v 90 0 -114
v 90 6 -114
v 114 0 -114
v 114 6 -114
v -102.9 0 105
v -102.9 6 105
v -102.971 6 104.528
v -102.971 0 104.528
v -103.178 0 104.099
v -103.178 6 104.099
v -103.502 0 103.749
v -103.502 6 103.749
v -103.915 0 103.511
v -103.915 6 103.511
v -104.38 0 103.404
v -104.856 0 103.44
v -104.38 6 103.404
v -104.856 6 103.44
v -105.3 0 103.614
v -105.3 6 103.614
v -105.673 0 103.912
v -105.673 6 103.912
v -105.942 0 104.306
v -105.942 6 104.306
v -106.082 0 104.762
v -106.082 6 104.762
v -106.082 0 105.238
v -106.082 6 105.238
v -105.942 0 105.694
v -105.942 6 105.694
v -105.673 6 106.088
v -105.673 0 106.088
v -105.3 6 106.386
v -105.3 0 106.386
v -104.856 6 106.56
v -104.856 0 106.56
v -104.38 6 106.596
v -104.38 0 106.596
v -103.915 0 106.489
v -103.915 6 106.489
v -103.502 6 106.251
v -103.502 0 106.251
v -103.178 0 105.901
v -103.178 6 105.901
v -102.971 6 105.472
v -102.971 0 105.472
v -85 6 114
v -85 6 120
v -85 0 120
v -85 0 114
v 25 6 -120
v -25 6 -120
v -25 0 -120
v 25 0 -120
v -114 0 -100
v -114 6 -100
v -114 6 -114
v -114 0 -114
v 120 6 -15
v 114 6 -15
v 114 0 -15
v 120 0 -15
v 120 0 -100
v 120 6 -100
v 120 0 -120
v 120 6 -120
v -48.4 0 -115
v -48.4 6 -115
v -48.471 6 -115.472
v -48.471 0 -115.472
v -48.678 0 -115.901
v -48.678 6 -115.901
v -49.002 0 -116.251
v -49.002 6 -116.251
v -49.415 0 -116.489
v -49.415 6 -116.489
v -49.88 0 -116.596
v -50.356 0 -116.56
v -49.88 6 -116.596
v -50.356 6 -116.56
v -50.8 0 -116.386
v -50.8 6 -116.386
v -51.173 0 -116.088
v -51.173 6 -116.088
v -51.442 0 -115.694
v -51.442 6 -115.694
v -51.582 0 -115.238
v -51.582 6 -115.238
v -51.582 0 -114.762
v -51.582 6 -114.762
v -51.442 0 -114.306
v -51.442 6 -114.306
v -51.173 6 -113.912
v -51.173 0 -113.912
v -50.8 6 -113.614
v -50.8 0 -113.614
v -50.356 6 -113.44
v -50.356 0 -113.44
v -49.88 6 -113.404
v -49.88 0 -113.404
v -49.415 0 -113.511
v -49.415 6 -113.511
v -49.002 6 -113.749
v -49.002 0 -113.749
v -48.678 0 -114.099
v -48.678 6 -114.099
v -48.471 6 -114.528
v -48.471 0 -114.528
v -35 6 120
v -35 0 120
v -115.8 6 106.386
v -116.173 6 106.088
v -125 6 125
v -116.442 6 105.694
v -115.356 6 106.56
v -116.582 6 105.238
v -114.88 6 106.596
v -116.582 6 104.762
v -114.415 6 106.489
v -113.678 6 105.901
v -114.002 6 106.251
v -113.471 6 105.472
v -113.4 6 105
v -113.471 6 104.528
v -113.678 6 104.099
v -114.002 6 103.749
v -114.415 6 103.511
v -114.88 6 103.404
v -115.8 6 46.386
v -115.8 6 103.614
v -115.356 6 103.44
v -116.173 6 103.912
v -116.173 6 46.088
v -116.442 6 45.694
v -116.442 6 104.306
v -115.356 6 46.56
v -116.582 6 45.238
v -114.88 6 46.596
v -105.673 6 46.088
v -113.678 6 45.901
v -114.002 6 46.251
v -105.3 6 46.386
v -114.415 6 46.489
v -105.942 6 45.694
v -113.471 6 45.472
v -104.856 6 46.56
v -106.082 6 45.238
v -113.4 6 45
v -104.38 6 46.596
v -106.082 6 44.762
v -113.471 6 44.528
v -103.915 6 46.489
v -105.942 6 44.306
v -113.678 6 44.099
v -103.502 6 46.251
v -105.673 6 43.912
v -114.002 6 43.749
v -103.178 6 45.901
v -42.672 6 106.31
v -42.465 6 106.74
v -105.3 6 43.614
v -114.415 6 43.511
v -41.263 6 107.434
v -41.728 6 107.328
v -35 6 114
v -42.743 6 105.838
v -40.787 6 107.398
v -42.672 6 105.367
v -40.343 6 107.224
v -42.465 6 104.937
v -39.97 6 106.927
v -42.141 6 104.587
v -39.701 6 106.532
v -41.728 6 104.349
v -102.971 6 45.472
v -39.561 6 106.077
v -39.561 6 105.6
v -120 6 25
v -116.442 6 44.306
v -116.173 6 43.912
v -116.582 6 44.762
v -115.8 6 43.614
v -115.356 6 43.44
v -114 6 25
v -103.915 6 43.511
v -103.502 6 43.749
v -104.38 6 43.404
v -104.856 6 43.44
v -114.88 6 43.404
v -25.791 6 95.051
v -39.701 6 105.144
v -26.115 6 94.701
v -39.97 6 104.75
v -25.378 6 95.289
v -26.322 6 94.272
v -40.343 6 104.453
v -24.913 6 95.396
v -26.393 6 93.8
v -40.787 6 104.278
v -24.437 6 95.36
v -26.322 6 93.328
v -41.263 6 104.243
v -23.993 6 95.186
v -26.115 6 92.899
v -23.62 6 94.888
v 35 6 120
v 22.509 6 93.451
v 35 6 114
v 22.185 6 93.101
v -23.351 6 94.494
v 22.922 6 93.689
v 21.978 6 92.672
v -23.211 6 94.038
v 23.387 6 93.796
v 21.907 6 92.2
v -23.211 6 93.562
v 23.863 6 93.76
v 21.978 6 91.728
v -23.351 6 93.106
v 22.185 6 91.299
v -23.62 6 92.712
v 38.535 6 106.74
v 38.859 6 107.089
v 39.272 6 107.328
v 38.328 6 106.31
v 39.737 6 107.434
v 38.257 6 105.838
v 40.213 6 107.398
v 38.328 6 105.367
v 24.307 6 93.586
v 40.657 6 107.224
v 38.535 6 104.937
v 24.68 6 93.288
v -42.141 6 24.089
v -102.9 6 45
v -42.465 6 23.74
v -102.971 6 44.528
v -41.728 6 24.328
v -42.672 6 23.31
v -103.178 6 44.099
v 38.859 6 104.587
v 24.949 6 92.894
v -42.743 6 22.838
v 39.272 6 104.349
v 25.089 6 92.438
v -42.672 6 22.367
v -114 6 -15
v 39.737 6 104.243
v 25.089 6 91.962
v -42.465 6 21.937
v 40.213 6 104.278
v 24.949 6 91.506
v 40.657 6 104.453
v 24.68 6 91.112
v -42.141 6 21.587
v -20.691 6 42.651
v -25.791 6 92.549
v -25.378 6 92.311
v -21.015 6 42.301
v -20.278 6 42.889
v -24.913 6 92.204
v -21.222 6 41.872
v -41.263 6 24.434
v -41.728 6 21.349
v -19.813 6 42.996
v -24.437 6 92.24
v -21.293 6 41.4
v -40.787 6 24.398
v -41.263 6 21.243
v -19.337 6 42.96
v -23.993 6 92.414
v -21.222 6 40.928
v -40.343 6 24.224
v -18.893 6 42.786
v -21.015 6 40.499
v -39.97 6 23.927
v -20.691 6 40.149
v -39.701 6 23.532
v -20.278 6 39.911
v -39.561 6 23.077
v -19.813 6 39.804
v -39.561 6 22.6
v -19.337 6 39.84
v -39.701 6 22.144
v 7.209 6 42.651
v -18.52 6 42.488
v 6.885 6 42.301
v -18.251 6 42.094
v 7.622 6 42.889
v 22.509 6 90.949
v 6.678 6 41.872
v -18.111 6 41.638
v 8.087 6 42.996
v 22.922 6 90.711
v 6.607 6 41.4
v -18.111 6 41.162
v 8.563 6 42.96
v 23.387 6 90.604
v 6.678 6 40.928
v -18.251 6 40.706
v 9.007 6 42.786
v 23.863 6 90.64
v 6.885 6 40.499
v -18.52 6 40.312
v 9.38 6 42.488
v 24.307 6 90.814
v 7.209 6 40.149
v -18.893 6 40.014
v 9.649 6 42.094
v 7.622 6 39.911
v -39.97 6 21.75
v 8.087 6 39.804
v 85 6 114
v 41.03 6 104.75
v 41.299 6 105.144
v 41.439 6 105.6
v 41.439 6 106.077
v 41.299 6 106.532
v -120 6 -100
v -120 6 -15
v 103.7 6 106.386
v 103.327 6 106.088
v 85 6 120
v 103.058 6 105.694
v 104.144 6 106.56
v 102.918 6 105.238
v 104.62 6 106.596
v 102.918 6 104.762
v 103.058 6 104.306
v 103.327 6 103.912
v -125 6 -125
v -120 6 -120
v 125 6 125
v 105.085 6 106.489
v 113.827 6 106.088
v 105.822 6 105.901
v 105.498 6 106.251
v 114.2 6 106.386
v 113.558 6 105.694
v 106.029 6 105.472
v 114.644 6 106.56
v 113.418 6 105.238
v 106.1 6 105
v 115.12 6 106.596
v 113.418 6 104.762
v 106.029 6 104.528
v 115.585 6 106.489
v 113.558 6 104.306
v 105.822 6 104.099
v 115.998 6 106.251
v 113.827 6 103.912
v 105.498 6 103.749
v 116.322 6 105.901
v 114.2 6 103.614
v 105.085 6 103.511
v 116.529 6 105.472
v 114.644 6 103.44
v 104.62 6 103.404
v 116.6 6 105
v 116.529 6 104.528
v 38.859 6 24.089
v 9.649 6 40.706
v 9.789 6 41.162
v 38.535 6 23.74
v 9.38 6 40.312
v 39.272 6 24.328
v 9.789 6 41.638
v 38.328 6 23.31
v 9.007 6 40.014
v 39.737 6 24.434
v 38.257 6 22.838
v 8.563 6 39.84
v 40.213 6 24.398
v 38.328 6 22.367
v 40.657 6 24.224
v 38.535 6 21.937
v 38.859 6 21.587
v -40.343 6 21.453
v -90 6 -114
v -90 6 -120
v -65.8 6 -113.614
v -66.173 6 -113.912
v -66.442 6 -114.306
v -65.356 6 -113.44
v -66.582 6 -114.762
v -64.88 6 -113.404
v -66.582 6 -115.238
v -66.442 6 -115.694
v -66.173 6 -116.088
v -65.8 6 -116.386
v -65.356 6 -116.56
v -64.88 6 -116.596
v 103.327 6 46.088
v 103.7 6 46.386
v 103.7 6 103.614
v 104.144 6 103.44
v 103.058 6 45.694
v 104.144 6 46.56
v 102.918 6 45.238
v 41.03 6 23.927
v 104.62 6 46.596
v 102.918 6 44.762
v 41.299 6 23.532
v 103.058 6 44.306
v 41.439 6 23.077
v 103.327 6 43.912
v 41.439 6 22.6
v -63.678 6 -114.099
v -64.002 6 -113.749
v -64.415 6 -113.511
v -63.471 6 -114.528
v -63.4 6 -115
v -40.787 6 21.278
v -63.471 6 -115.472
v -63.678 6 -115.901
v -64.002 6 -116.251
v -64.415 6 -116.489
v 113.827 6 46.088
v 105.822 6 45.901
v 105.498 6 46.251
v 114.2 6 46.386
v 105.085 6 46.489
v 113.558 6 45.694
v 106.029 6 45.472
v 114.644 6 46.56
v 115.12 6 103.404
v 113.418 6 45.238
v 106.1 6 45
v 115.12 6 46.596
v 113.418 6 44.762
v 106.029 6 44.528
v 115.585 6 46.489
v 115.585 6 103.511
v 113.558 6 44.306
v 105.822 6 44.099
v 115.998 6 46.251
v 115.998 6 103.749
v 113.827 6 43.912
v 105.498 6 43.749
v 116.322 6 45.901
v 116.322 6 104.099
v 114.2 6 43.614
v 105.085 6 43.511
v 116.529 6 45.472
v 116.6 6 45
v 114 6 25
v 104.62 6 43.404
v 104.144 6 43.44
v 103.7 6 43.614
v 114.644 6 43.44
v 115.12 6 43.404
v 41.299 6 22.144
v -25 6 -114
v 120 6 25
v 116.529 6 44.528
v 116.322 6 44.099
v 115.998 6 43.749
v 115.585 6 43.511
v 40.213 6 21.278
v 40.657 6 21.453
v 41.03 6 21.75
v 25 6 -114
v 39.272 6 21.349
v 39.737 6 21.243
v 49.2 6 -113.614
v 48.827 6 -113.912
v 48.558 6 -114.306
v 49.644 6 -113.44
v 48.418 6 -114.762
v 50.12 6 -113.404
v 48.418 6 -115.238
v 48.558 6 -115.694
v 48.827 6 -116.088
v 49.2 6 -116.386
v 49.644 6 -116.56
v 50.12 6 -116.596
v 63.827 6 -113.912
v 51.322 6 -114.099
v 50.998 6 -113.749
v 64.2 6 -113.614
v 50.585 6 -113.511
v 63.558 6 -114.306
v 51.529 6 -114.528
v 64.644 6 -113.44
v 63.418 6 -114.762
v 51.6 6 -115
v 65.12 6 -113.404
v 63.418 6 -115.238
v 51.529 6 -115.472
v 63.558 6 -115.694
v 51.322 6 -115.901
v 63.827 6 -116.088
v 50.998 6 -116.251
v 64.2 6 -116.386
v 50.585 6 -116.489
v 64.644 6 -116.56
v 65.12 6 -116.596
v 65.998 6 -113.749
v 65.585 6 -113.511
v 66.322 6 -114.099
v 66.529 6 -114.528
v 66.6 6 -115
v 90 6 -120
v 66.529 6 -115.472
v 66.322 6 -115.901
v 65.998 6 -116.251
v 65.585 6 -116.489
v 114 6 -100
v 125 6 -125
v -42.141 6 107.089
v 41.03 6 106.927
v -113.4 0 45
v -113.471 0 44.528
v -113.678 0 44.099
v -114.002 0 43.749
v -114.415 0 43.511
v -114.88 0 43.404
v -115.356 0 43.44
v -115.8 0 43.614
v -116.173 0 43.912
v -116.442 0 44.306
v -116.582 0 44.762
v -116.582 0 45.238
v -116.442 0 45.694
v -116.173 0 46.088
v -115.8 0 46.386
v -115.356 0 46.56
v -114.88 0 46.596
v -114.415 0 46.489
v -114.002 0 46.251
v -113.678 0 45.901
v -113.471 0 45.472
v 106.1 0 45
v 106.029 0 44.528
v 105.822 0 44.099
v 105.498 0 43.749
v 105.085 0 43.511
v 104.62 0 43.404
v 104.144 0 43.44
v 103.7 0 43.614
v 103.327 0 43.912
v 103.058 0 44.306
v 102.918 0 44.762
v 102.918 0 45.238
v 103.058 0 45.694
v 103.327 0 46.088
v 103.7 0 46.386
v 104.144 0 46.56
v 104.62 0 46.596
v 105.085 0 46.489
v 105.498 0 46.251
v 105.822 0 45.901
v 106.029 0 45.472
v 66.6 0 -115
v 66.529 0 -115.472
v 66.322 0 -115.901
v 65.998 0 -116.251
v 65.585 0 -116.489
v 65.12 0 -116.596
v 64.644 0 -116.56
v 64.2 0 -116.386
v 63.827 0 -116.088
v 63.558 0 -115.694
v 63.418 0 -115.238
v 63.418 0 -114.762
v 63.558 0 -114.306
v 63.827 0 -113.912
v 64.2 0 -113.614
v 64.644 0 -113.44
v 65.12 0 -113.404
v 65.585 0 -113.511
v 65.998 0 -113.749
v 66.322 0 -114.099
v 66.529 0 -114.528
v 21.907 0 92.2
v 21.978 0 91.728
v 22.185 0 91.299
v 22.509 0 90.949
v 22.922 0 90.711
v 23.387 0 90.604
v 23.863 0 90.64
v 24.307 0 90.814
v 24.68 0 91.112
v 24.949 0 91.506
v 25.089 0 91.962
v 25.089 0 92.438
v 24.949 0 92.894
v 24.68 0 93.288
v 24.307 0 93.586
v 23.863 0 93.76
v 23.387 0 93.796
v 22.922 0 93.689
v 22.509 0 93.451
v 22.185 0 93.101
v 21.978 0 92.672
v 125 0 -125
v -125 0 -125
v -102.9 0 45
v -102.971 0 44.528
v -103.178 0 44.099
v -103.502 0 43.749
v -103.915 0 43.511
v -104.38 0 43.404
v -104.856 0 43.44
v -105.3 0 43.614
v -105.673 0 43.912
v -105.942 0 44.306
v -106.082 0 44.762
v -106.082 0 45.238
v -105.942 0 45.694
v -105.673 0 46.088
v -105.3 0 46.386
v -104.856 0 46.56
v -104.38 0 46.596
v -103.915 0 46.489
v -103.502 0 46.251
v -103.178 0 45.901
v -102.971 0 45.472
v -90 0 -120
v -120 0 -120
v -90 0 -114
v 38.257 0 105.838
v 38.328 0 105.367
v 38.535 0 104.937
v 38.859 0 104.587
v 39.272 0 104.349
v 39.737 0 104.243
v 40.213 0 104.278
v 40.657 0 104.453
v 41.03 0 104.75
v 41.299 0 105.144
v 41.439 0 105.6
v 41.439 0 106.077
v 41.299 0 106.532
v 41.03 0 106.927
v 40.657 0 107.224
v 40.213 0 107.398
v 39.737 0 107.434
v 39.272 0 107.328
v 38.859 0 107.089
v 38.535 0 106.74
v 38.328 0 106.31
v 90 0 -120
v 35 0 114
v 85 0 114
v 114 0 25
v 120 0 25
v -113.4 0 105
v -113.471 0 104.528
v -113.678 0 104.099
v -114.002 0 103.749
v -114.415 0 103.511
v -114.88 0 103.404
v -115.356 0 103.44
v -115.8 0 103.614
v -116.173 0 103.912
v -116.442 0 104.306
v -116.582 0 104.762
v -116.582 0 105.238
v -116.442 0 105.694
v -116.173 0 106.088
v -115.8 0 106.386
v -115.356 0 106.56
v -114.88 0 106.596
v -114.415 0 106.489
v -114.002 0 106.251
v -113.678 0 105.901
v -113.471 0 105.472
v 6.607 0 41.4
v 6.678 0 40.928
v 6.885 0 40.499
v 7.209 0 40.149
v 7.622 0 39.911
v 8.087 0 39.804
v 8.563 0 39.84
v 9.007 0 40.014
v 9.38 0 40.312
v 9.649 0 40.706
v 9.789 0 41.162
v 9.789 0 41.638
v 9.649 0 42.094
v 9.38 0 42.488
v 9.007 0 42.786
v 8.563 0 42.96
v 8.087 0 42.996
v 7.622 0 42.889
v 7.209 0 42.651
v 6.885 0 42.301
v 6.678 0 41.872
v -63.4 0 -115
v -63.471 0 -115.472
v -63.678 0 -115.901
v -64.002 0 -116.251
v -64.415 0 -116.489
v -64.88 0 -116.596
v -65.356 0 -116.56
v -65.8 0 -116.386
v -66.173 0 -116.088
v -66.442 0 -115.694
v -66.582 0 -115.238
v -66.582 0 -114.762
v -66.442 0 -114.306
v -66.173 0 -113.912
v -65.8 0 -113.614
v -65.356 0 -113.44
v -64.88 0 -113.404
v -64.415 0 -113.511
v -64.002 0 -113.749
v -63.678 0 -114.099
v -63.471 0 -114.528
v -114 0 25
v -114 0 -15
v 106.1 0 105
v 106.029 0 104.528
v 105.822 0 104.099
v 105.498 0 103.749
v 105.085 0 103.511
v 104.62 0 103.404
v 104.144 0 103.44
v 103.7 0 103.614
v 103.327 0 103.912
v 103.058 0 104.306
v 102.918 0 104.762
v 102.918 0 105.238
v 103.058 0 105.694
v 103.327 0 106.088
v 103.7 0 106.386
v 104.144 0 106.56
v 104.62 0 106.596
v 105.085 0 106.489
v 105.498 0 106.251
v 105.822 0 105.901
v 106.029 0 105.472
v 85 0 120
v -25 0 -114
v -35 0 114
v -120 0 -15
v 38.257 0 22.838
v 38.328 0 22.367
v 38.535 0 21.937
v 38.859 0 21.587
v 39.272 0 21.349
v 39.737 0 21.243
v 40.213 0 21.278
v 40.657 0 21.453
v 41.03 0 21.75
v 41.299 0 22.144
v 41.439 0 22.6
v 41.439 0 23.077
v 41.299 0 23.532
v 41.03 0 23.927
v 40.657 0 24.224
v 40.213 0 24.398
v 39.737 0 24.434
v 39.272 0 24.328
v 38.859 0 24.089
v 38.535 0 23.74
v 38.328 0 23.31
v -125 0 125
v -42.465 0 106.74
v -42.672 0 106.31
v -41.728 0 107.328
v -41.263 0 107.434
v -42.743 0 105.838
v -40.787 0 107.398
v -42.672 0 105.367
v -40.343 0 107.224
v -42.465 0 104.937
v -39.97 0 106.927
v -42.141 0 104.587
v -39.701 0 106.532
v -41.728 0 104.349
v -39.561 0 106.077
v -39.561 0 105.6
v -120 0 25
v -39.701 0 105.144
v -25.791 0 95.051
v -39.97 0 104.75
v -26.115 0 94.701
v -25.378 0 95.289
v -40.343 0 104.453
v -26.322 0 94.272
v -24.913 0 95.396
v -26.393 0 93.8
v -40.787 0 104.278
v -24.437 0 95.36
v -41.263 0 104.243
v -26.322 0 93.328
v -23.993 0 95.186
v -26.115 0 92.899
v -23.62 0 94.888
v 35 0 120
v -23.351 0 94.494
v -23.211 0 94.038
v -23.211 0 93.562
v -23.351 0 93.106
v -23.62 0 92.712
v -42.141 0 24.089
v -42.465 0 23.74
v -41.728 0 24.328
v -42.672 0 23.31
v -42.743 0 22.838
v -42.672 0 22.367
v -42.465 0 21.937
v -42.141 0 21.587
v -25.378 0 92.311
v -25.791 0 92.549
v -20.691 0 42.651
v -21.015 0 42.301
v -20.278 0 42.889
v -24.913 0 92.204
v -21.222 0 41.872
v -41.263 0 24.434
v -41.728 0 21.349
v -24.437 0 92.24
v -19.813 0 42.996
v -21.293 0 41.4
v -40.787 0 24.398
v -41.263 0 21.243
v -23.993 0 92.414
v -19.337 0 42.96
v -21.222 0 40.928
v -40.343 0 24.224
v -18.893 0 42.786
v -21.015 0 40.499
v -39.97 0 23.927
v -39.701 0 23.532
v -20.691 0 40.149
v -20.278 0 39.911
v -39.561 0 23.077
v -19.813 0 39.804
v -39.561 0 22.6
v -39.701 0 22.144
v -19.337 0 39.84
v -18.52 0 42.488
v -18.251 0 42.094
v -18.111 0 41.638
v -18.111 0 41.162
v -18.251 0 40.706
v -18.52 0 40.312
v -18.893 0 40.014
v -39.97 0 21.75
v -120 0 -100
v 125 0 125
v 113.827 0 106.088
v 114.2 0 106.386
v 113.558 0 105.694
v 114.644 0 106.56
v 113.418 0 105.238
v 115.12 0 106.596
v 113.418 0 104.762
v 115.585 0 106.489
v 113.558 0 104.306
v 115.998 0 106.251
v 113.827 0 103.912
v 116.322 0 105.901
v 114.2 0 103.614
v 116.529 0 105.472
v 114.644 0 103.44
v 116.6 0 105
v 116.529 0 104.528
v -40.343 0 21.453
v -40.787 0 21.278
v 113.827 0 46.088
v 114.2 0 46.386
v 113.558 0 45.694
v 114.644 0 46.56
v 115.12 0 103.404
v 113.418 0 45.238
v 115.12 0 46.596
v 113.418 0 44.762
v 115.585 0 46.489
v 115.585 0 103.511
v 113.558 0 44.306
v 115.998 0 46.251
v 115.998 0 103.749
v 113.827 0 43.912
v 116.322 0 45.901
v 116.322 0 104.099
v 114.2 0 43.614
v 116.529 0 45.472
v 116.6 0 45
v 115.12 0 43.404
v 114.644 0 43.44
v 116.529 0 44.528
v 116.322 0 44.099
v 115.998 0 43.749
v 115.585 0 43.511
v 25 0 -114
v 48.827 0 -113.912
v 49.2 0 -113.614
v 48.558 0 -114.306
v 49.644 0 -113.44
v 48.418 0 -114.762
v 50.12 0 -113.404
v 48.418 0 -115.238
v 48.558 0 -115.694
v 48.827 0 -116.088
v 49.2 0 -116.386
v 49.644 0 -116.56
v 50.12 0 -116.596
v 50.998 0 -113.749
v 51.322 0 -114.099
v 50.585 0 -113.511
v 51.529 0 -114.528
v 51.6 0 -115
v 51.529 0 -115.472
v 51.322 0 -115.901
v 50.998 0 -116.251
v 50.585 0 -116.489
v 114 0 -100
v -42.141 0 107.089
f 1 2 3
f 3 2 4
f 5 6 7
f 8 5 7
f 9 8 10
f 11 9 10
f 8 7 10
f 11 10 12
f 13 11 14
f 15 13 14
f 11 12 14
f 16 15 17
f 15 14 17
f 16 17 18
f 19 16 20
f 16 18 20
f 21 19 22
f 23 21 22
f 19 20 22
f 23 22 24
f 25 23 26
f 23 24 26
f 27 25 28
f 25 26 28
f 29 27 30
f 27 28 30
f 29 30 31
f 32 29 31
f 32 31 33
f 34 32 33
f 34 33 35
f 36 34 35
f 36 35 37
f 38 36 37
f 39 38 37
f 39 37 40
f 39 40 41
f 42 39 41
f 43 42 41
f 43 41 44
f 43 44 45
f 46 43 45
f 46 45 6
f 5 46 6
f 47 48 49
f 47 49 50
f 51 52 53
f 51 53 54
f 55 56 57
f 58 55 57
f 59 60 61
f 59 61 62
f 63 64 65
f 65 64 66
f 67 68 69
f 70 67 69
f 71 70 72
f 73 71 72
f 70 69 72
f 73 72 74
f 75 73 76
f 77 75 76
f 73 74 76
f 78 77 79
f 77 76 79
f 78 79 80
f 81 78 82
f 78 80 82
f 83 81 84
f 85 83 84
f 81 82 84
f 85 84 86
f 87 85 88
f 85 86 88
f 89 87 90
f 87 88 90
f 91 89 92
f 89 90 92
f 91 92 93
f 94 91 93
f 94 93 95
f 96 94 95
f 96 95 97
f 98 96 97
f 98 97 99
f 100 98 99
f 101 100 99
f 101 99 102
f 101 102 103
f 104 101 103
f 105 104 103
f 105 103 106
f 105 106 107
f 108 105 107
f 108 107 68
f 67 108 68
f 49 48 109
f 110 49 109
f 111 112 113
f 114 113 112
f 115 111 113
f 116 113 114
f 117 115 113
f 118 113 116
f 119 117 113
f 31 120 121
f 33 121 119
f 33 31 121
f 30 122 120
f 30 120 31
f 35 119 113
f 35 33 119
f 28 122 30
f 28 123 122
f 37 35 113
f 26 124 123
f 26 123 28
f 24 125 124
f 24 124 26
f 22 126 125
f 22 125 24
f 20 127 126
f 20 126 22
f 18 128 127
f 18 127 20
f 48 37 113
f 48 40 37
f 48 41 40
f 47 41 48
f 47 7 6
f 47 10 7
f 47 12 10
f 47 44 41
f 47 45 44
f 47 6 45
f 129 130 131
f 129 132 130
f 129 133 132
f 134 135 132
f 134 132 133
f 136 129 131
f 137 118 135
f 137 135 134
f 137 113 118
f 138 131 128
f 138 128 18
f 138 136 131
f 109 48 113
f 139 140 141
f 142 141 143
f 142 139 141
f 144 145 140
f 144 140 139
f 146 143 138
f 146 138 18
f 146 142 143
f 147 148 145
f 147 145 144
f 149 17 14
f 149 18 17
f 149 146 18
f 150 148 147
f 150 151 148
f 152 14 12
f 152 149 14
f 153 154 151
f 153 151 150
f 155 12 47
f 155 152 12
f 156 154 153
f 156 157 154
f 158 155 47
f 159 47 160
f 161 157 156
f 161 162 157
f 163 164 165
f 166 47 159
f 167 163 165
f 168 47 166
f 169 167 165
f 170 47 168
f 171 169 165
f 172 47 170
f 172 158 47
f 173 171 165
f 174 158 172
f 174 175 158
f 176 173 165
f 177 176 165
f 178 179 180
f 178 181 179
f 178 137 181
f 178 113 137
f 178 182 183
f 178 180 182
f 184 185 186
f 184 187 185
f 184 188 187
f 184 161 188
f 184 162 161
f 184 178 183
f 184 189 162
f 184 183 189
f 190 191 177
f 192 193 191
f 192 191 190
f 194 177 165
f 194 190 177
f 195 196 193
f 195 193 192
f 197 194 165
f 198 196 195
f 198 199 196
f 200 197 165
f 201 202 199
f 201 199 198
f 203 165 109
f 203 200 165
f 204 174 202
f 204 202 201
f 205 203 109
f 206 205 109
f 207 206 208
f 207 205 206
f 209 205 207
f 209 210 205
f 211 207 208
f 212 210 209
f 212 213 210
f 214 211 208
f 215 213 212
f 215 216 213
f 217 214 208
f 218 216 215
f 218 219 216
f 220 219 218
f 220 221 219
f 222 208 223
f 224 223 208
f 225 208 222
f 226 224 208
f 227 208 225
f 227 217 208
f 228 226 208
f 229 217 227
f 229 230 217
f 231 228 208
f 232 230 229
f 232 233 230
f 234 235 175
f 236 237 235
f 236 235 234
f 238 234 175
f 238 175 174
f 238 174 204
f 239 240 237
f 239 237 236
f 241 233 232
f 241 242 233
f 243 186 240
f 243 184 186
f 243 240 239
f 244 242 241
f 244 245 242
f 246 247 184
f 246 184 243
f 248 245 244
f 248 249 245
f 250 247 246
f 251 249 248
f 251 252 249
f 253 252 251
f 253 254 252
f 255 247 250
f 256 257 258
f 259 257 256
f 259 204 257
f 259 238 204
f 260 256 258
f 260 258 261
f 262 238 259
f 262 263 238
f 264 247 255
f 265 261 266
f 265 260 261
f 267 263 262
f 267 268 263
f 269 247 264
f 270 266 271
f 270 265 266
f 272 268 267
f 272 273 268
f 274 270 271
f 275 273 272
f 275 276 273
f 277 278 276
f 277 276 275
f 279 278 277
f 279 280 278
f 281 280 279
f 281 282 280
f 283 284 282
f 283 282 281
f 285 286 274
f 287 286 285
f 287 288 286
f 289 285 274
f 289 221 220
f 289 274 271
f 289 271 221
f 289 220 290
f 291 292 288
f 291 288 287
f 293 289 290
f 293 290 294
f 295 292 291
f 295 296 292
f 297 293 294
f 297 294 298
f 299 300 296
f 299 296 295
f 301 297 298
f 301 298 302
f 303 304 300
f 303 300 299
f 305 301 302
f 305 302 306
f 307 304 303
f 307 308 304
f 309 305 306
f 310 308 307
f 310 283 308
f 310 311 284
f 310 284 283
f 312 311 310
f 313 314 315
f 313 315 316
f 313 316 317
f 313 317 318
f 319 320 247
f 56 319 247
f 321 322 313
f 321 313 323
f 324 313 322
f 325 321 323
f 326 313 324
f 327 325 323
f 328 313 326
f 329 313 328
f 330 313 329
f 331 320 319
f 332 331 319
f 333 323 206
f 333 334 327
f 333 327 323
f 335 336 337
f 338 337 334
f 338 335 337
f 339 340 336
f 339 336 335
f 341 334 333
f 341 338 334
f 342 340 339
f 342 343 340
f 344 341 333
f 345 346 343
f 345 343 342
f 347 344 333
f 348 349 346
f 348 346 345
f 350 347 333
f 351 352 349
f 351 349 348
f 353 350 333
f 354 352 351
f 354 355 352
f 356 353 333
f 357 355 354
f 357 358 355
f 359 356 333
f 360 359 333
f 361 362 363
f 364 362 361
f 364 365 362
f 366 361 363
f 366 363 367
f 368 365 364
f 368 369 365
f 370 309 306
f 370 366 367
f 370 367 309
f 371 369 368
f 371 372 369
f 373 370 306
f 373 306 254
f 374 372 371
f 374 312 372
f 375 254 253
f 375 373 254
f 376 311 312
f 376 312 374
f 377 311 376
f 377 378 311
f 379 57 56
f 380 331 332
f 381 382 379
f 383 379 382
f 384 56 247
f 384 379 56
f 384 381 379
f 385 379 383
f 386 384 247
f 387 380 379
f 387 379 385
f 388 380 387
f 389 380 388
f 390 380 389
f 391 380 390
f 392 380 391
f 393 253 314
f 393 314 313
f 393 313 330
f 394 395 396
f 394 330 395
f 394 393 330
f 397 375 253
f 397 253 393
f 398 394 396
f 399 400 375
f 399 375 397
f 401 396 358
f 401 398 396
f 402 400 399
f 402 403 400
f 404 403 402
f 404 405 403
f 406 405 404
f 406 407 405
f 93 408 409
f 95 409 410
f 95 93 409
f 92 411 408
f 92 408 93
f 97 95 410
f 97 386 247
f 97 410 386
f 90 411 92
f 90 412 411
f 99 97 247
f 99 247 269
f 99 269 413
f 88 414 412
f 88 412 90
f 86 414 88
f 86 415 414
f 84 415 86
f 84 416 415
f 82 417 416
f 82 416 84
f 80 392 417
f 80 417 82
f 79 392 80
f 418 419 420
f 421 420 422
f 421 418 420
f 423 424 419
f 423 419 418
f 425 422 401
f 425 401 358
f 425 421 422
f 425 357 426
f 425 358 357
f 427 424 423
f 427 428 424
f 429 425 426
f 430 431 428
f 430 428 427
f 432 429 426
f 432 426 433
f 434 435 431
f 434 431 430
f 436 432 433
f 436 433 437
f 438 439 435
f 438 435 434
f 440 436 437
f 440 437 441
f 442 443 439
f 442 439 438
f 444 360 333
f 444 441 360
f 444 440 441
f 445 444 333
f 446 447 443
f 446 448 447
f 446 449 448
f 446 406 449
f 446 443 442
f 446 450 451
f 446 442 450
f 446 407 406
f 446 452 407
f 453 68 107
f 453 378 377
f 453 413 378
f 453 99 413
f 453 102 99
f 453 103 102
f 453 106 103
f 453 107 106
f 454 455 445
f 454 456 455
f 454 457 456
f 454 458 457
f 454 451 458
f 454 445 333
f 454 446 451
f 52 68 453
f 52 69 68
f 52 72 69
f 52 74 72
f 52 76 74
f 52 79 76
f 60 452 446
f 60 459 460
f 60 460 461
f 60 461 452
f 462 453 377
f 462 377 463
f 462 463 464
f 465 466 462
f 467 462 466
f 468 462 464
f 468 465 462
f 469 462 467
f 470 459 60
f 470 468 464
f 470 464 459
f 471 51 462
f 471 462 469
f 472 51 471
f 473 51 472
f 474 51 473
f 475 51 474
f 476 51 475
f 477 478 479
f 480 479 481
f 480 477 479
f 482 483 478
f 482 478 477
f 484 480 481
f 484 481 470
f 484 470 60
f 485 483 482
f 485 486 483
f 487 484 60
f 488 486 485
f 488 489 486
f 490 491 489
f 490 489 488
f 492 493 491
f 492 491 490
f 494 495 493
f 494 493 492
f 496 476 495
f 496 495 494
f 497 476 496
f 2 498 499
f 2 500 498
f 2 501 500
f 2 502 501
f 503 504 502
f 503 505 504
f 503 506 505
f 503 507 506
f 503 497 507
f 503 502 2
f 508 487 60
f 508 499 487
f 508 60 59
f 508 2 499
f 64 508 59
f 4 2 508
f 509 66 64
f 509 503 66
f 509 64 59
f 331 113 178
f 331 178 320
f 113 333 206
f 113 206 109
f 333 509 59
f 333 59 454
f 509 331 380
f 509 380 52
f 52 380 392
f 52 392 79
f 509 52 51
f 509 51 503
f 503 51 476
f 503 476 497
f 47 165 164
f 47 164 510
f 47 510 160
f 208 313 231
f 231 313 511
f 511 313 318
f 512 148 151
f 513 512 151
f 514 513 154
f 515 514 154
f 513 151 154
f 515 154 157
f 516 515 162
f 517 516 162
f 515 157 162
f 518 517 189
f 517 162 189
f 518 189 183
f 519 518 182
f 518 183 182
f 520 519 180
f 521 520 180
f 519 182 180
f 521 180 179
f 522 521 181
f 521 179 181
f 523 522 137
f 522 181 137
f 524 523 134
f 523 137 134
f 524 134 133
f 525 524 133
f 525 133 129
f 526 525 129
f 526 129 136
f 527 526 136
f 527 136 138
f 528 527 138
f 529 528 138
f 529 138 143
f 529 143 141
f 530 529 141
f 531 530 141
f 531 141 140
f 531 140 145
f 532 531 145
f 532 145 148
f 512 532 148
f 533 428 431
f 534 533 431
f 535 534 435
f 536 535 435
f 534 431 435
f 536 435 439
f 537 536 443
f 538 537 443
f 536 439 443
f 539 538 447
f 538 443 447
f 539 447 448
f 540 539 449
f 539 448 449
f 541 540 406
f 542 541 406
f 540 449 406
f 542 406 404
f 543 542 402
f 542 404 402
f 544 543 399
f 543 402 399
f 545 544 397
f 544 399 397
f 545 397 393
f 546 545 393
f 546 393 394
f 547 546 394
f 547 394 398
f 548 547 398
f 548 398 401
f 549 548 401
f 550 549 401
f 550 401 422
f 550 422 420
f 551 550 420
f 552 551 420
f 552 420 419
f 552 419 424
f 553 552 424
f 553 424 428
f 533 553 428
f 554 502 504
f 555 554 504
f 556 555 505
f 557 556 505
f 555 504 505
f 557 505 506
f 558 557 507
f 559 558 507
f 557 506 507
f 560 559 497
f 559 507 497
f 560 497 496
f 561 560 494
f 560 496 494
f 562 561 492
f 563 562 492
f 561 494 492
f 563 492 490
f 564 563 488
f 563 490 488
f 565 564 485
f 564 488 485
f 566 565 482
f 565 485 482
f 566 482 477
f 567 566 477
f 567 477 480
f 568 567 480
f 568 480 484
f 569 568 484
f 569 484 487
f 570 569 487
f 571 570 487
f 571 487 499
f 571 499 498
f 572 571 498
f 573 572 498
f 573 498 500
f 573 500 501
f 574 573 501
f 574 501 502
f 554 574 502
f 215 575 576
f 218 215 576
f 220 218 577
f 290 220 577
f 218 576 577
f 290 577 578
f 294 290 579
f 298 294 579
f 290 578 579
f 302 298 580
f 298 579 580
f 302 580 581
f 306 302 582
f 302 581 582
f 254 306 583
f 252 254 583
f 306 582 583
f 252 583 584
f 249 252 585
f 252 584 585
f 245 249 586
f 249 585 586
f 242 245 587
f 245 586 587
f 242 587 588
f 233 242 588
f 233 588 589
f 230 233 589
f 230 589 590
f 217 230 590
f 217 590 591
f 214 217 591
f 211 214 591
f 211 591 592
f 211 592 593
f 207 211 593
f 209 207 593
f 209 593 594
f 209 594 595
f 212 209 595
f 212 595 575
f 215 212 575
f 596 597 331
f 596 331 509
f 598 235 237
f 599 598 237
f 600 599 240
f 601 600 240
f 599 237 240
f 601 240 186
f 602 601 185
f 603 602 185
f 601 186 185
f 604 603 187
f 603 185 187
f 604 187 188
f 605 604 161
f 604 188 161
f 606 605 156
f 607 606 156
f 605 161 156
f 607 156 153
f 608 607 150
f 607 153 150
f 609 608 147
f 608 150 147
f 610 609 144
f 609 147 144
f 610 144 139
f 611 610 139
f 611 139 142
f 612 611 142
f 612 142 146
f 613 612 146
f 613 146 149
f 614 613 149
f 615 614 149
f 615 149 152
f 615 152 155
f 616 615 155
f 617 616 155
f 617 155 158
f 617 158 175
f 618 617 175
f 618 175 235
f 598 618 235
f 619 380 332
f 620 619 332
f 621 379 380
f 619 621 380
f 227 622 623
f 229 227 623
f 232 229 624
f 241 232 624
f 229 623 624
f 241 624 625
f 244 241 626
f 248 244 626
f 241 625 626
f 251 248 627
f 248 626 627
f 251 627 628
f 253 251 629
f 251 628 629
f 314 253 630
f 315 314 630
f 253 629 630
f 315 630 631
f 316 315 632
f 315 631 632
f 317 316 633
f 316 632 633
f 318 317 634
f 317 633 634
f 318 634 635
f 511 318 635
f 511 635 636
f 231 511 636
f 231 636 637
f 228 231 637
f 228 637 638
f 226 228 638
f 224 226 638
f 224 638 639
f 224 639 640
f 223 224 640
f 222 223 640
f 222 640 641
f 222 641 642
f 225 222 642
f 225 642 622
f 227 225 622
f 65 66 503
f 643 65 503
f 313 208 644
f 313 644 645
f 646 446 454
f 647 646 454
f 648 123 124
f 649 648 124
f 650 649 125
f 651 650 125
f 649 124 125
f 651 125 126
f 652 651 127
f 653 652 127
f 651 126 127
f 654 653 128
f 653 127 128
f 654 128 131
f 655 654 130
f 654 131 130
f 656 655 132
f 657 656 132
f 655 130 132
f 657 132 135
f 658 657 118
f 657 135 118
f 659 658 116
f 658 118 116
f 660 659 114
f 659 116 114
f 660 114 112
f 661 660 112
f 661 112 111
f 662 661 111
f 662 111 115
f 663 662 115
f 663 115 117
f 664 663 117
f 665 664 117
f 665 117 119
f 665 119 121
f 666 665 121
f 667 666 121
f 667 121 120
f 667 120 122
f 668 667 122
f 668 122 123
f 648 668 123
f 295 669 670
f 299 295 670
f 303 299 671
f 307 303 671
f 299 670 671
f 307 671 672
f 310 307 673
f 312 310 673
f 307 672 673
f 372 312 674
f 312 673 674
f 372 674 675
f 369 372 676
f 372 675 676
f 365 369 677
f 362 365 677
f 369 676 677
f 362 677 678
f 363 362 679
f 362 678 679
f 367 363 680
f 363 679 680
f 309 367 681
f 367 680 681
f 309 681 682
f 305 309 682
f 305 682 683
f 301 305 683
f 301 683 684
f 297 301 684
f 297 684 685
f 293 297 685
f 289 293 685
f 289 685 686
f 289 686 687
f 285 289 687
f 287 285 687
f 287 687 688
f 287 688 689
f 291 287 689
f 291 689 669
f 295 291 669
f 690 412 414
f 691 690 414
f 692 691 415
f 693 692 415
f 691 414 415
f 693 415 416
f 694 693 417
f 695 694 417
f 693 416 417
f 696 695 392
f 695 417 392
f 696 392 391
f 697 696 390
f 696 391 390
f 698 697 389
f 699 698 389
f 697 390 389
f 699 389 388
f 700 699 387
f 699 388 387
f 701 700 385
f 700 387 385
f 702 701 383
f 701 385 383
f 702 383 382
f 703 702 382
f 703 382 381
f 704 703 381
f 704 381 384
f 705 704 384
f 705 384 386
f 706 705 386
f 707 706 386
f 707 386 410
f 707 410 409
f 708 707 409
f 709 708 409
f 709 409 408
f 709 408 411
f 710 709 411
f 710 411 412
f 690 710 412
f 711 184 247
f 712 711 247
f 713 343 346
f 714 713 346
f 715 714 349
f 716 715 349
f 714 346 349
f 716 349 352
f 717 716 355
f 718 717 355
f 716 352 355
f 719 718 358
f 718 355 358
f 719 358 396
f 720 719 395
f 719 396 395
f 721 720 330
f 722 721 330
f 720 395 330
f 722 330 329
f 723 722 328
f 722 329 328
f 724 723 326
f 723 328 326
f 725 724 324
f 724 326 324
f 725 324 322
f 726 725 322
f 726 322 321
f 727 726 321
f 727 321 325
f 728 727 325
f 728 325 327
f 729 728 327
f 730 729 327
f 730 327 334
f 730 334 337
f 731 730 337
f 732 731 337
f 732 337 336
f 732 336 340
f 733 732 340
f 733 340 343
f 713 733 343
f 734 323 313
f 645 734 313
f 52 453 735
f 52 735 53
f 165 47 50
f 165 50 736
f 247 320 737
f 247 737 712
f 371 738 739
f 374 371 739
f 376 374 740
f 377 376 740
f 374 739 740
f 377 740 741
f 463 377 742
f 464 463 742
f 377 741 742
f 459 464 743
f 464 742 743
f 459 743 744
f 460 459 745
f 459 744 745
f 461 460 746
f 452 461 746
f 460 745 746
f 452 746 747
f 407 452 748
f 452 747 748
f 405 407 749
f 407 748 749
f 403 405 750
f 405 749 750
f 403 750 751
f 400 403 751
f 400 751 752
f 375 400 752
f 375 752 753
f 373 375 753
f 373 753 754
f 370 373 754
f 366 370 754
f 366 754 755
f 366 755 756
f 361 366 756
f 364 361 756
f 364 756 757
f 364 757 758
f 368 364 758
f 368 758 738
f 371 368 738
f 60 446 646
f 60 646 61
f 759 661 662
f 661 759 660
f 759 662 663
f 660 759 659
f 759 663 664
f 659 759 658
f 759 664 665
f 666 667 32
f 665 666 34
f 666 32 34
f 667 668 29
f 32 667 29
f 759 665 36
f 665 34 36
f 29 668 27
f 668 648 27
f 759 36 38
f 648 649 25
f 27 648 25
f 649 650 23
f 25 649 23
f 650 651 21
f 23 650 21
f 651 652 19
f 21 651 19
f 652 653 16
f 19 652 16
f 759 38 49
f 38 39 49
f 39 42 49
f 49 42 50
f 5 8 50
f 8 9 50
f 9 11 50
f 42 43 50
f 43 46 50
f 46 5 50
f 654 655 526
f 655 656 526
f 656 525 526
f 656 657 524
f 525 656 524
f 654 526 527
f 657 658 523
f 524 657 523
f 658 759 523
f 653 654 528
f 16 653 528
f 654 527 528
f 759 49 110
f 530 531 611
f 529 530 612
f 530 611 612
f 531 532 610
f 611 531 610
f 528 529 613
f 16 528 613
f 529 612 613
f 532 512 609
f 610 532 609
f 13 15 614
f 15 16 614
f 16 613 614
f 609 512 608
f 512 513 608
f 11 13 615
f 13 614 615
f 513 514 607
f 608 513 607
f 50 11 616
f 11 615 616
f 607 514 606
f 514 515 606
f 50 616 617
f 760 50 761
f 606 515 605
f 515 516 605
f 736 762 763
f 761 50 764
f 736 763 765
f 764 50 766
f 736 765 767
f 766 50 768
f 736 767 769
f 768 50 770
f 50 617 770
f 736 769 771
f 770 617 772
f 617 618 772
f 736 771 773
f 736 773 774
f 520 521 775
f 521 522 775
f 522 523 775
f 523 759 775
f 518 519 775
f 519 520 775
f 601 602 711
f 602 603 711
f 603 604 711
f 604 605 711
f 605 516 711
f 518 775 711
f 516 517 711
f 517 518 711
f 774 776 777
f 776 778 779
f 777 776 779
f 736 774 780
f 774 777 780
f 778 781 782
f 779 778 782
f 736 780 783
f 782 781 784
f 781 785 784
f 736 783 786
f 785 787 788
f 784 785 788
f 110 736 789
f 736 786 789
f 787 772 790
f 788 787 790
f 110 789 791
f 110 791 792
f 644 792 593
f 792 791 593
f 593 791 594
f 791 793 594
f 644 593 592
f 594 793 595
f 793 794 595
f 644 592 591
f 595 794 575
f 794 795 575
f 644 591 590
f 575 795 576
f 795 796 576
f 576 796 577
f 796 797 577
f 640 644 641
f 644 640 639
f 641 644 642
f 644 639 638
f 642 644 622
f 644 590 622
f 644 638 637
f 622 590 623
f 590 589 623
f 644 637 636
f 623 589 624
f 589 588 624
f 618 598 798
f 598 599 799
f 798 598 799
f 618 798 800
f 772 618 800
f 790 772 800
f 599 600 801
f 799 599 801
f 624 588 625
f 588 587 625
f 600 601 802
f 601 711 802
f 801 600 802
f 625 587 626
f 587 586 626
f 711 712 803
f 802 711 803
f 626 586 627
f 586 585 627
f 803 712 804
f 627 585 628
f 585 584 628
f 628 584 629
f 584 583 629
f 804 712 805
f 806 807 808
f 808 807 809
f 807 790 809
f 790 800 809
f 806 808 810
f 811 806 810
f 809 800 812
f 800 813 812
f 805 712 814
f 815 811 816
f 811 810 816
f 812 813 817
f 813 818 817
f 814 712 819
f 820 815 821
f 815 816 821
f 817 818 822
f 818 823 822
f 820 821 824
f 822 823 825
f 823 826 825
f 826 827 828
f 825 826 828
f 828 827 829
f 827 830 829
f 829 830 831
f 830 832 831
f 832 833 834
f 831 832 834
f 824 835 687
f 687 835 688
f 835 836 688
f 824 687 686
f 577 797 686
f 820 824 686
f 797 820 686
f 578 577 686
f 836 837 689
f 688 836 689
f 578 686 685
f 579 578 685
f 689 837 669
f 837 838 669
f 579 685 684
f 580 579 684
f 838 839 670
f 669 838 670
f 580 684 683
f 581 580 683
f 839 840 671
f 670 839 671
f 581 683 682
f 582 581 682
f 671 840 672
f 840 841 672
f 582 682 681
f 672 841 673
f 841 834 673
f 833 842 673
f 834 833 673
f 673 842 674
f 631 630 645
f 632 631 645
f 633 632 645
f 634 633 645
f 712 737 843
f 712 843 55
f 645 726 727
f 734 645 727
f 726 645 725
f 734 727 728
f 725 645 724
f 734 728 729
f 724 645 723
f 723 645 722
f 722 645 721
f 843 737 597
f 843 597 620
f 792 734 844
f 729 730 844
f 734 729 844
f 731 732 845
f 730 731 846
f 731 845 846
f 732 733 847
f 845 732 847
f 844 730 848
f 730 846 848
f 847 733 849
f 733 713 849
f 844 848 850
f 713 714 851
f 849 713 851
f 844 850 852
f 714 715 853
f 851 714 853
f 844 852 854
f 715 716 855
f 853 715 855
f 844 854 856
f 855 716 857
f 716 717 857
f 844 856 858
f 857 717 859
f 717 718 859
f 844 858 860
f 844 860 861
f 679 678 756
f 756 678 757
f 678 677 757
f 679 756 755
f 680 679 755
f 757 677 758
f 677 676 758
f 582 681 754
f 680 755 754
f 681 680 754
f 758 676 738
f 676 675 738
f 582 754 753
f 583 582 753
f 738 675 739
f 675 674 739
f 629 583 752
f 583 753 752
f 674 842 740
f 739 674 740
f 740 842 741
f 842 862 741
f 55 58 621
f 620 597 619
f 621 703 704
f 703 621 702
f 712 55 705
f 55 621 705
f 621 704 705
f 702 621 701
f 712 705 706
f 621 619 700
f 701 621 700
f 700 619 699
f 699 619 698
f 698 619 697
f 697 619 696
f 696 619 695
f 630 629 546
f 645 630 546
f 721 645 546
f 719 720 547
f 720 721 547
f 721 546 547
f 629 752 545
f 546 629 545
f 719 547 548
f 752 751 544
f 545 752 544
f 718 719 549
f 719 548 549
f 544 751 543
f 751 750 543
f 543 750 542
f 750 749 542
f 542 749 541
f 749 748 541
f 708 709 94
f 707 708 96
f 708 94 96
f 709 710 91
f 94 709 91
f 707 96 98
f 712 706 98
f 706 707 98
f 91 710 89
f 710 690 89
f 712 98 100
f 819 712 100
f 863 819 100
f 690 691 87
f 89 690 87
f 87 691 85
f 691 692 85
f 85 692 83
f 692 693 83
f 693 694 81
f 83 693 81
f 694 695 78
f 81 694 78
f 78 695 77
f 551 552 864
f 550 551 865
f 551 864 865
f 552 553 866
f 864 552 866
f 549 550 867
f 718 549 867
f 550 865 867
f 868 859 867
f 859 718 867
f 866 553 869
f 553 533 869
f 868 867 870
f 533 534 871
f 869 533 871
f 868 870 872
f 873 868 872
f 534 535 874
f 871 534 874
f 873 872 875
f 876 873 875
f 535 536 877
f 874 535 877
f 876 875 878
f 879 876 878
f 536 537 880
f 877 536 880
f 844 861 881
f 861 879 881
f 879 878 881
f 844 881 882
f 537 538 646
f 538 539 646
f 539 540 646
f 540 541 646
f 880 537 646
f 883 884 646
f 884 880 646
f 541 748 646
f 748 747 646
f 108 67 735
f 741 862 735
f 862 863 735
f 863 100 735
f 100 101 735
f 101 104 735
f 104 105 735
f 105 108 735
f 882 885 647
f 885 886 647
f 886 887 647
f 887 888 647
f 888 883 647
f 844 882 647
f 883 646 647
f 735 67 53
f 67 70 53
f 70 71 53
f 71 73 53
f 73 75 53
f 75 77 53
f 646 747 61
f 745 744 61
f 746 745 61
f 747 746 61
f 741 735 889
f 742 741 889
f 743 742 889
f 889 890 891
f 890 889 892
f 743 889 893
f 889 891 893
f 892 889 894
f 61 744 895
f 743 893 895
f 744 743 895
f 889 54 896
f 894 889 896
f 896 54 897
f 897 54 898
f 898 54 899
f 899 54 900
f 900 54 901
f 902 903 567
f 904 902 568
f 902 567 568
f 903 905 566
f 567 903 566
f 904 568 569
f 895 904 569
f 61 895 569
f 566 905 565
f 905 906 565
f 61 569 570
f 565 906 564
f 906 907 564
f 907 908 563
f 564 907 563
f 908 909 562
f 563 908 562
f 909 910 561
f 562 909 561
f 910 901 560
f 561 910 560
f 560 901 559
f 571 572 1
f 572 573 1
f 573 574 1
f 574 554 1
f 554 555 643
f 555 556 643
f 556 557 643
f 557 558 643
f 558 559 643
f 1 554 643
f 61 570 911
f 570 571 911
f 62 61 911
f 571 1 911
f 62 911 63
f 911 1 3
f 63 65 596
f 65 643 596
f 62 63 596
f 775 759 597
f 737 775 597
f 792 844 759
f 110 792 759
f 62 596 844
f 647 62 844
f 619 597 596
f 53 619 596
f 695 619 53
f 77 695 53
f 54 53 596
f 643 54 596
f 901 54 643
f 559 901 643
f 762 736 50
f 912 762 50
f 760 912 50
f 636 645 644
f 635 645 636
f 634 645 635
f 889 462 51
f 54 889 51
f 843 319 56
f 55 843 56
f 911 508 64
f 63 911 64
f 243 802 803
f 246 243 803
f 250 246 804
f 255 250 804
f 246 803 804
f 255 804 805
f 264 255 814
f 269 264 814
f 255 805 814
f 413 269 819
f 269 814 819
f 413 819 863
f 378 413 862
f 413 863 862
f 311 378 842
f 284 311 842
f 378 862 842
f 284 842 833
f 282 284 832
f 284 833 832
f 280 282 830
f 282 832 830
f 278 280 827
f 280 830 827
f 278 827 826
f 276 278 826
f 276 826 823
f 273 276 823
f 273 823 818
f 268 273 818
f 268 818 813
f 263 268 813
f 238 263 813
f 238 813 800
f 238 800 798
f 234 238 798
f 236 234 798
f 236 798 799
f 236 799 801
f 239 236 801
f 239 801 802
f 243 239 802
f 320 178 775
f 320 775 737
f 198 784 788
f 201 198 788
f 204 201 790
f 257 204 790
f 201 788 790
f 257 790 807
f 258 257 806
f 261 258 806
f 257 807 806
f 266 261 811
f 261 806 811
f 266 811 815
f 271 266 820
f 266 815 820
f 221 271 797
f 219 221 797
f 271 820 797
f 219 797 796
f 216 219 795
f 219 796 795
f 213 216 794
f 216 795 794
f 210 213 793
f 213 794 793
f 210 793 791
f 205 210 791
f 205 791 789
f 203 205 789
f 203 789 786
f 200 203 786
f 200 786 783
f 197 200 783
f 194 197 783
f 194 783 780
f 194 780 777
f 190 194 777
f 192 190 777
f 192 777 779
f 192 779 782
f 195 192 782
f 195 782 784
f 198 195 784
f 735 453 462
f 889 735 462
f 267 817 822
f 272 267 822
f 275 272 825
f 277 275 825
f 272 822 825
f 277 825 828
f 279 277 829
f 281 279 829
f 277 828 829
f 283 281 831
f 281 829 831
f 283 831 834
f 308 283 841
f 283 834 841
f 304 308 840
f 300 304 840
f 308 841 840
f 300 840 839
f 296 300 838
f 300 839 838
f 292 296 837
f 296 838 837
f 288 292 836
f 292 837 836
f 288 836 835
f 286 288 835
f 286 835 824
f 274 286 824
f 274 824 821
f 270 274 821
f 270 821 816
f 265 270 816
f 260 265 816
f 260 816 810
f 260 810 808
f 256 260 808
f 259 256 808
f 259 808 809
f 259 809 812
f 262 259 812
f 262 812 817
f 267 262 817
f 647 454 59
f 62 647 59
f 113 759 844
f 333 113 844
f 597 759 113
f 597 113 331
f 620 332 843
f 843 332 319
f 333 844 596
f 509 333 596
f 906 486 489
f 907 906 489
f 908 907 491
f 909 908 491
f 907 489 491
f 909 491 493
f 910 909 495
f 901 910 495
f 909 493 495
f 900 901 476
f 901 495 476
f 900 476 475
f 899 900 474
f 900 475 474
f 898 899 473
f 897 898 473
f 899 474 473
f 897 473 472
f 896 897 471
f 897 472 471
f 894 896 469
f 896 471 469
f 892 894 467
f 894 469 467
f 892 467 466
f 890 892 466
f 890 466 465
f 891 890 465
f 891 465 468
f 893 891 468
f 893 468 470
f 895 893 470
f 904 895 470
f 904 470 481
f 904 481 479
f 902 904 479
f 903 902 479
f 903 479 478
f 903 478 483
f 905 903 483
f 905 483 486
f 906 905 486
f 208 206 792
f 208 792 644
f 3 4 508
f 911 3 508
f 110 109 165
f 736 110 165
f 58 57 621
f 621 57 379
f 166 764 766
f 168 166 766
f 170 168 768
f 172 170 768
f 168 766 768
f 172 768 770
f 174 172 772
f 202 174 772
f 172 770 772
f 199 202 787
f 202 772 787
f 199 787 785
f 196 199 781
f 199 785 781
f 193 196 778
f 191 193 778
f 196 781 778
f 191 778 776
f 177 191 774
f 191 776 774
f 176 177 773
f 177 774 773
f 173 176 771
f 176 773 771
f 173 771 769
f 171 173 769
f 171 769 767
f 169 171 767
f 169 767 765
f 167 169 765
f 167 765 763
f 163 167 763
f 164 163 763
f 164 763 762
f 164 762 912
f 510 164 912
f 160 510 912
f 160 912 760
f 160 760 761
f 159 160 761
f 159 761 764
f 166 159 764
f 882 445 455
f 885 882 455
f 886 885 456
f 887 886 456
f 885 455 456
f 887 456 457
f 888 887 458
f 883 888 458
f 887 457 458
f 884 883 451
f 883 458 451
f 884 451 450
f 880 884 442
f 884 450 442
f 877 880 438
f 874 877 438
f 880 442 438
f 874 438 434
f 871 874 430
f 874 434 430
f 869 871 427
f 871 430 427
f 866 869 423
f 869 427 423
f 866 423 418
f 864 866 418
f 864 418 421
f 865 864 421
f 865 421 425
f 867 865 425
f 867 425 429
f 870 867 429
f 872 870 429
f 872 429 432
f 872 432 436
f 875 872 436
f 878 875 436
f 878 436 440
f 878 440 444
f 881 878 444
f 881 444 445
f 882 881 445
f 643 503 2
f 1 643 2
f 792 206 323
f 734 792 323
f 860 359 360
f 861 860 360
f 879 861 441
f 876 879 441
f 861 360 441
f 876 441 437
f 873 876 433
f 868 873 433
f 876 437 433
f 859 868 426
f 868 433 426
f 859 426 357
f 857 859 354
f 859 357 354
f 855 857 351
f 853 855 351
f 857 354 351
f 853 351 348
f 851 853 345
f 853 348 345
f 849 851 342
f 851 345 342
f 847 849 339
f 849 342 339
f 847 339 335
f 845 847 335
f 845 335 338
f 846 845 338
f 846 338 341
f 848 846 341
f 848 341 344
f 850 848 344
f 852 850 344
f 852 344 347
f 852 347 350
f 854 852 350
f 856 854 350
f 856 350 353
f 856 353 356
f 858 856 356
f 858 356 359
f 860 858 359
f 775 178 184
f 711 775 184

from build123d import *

# Parameters (mm, degrees)
SKETCH1_W           = 250
SKETCH1_H           = 250
BOSS_EXTRUDE1_DEPTH = 6
CUT_EXTRUDE2_REACH  = 8
SKETCH4_R           = 1.6
CUT_EXTRUDE3_REACH  = 8
SKETCH5_R           = 1.6
SKETCH6_W           = 6
SKETCH6_H           = 40
SKETCH6_W_2         = 50
SKETCH6_H_2         = 6
CUT_EXTRUDE6_DEPTH  = 6
CUT_EXTRUDE7_REACH  = 8
SKETCH7_R           = 1.6
CUT_EXTRUDE8_REACH  = 8
SKETCH8_R           = 1.6


with BuildPart() as part:
    # Sketch1 → Boss-Extrude1 (new body)
    with BuildSketch(Plane(origin=(0, 0, 0), x_dir=(1, 0, 0), z_dir=(0, 1, 0))):
        Rectangle(SKETCH1_W, SKETCH1_H)
    extrude(amount=BOSS_EXTRUDE1_DEPTH)

    # Sketch4 → Cut-Extrude2 (cut, up to next)
    with BuildSketch(Plane(origin=(0, 6, 0), x_dir=(1, 0, 0), z_dir=(0, 1, 0)), mode=Mode.PRIVATE) as cut_extrude2_sk1:
        with Locations((-115, -105)):
            Circle(SKETCH4_R)
    cut_extrude2_tool1 = extrude(cut_extrude2_sk1.sketch, amount=-CUT_EXTRUDE2_REACH, mode=Mode.PRIVATE) & part.part
    add(cut_extrude2_tool1.solids().sort_by_distance((-115, 6, 105))[0], mode=Mode.SUBTRACT)
    # Sketch4 → Cut-Extrude2 (cut, up to next)
    with BuildSketch(Plane(origin=(0, 6, 0), x_dir=(1, 0, 0), z_dir=(0, 1, 0)), mode=Mode.PRIVATE) as cut_extrude2_sk2:
        with Locations((-104.5, -105)):
            Circle(SKETCH4_R)
    cut_extrude2_tool2 = extrude(cut_extrude2_sk2.sketch, amount=-CUT_EXTRUDE2_REACH, mode=Mode.PRIVATE) & part.part
    add(cut_extrude2_tool2.solids().sort_by_distance((-104.5, 6, 105))[0], mode=Mode.SUBTRACT)
    # Sketch4 → Cut-Extrude2 (cut, up to next)
    with BuildSketch(Plane(origin=(0, 6, 0), x_dir=(1, 0, 0), z_dir=(0, 1, 0)), mode=Mode.PRIVATE) as cut_extrude2_sk3:
        with Locations((-115, -45)):
            Circle(SKETCH4_R)
    cut_extrude2_tool3 = extrude(cut_extrude2_sk3.sketch, amount=-CUT_EXTRUDE2_REACH, mode=Mode.PRIVATE) & part.part
    add(cut_extrude2_tool3.solids().sort_by_distance((-115, 6, 45))[0], mode=Mode.SUBTRACT)
    # Sketch4 → Cut-Extrude2 (cut, up to next)
    with BuildSketch(Plane(origin=(0, 6, 0), x_dir=(1, 0, 0), z_dir=(0, 1, 0)), mode=Mode.PRIVATE) as cut_extrude2_sk4:
        with Locations((-104.5, -45)):
            Circle(SKETCH4_R)
    cut_extrude2_tool4 = extrude(cut_extrude2_sk4.sketch, amount=-CUT_EXTRUDE2_REACH, mode=Mode.PRIVATE) & part.part
    add(cut_extrude2_tool4.solids().sort_by_distance((-104.5, 6, 45))[0], mode=Mode.SUBTRACT)
    # Sketch4 → Cut-Extrude2 (cut, up to next)
    with BuildSketch(Plane(origin=(0, 6, 0), x_dir=(1, 0, 0), z_dir=(0, 1, 0)), mode=Mode.PRIVATE) as cut_extrude2_sk5:
        with Locations((115, -45)):
            Circle(SKETCH4_R)
    cut_extrude2_tool5 = extrude(cut_extrude2_sk5.sketch, amount=-CUT_EXTRUDE2_REACH, mode=Mode.PRIVATE) & part.part
    add(cut_extrude2_tool5.solids().sort_by_distance((115, 6, 45))[0], mode=Mode.SUBTRACT)
    # Sketch4 → Cut-Extrude2 (cut, up to next)
    with BuildSketch(Plane(origin=(0, 6, 0), x_dir=(1, 0, 0), z_dir=(0, 1, 0)), mode=Mode.PRIVATE) as cut_extrude2_sk6:
        with Locations((104.5, -45)):
            Circle(SKETCH4_R)
    cut_extrude2_tool6 = extrude(cut_extrude2_sk6.sketch, amount=-CUT_EXTRUDE2_REACH, mode=Mode.PRIVATE) & part.part
    add(cut_extrude2_tool6.solids().sort_by_distance((104.5, 6, 45))[0], mode=Mode.SUBTRACT)
    # Sketch4 → Cut-Extrude2 (cut, up to next)
    with BuildSketch(Plane(origin=(0, 6, 0), x_dir=(1, 0, 0), z_dir=(0, 1, 0)), mode=Mode.PRIVATE) as cut_extrude2_sk7:
        with Locations((115, -105)):
            Circle(SKETCH4_R)
    cut_extrude2_tool7 = extrude(cut_extrude2_sk7.sketch, amount=-CUT_EXTRUDE2_REACH, mode=Mode.PRIVATE) & part.part
    add(cut_extrude2_tool7.solids().sort_by_distance((115, 6, 105))[0], mode=Mode.SUBTRACT)
    # Sketch4 → Cut-Extrude2 (cut, up to next)
    with BuildSketch(Plane(origin=(0, 6, 0), x_dir=(1, 0, 0), z_dir=(0, 1, 0)), mode=Mode.PRIVATE) as cut_extrude2_sk8:
        with Locations((104.5, -105)):
            Circle(SKETCH4_R)
    cut_extrude2_tool8 = extrude(cut_extrude2_sk8.sketch, amount=-CUT_EXTRUDE2_REACH, mode=Mode.PRIVATE) & part.part
    add(cut_extrude2_tool8.solids().sort_by_distance((104.5, 6, 105))[0], mode=Mode.SUBTRACT)

    # Sketch5 → Cut-Extrude3 (cut, up to next)
    with BuildSketch(Plane(origin=(0, 6, 0), x_dir=(1, 0, 0), z_dir=(0, 1, 0)), mode=Mode.PRIVATE) as cut_extrude3_sk1:
        with Locations((-65, 115)):
            Circle(SKETCH5_R)
    cut_extrude3_tool1 = extrude(cut_extrude3_sk1.sketch, amount=-CUT_EXTRUDE3_REACH, mode=Mode.PRIVATE) & part.part
    add(cut_extrude3_tool1.solids().sort_by_distance((-65, 6, -115))[0], mode=Mode.SUBTRACT)
    # Sketch5 → Cut-Extrude3 (cut, up to next)
    with BuildSketch(Plane(origin=(0, 6, 0), x_dir=(1, 0, 0), z_dir=(0, 1, 0)), mode=Mode.PRIVATE) as cut_extrude3_sk2:
        with Locations((-50, 115)):
            Circle(SKETCH5_R)
    cut_extrude3_tool2 = extrude(cut_extrude3_sk2.sketch, amount=-CUT_EXTRUDE3_REACH, mode=Mode.PRIVATE) & part.part
    add(cut_extrude3_tool2.solids().sort_by_distance((-50, 6, -115))[0], mode=Mode.SUBTRACT)
    # Sketch5 → Cut-Extrude3 (cut, up to next)
    with BuildSketch(Plane(origin=(0, 6, 0), x_dir=(1, 0, 0), z_dir=(0, 1, 0)), mode=Mode.PRIVATE) as cut_extrude3_sk3:
        with Locations((50, 115)):
            Circle(SKETCH5_R)
    cut_extrude3_tool3 = extrude(cut_extrude3_sk3.sketch, amount=-CUT_EXTRUDE3_REACH, mode=Mode.PRIVATE) & part.part
    add(cut_extrude3_tool3.solids().sort_by_distance((50, 6, -115))[0], mode=Mode.SUBTRACT)
    # Sketch5 → Cut-Extrude3 (cut, up to next)
    with BuildSketch(Plane(origin=(0, 6, 0), x_dir=(1, 0, 0), z_dir=(0, 1, 0)), mode=Mode.PRIVATE) as cut_extrude3_sk4:
        with Locations((65, 115)):
            Circle(SKETCH5_R)
    cut_extrude3_tool4 = extrude(cut_extrude3_sk4.sketch, amount=-CUT_EXTRUDE3_REACH, mode=Mode.PRIVATE) & part.part
    add(cut_extrude3_tool4.solids().sort_by_distance((65, 6, -115))[0], mode=Mode.SUBTRACT)

    # Sketch6 → Cut-Extrude6 (cut)
    with BuildSketch(Plane(origin=(0, 6, 0), x_dir=(1, 0, 0), z_dir=(0, 1, 0))):
        Polygon((-90, 120), (-120, 120), (-120, 100), (-114, 100), (-114, 114), (-90, 114), align=None)
        with Locations((-117, -5)):
            Rectangle(SKETCH6_W, SKETCH6_H)
        with Locations((-60, -117)):
            Rectangle(SKETCH6_W_2, SKETCH6_H_2)
        with Locations((60, -117)):
            Rectangle(SKETCH6_W_2, SKETCH6_H_2)
        Polygon((120, 100), (120, 120), (90, 120), (90, 114), (114, 114), (114, 100), align=None)
        with Locations((117, -5)):
            Rectangle(SKETCH6_W, SKETCH6_H)
        with Locations((0, 117)):
            Rectangle(SKETCH6_W_2, SKETCH6_H_2)
    extrude(amount=-CUT_EXTRUDE6_DEPTH, mode=Mode.SUBTRACT)

    # Sketch7 → Cut-Extrude7 (cut, up to next)
    with BuildSketch(Plane(origin=(0, 0, 0), x_dir=(-1, 0, 0), z_dir=(0, -1, 0)), mode=Mode.PRIVATE) as cut_extrude7_sk1:
        with Locations((19.693028717, -41.4)):
            Circle(SKETCH7_R)
    cut_extrude7_tool1 = extrude(cut_extrude7_sk1.sketch, amount=-CUT_EXTRUDE7_REACH, mode=Mode.PRIVATE) & part.part
    add(cut_extrude7_tool1.solids().sort_by_distance((-19.693029, 0, 41.4))[0], mode=Mode.SUBTRACT)
    # Sketch7 → Cut-Extrude7 (cut, up to next)
    with BuildSketch(Plane(origin=(0, 0, 0), x_dir=(-1, 0, 0), z_dir=(0, -1, 0)), mode=Mode.PRIVATE) as cut_extrude7_sk2:
        with Locations((-8.206971283, -41.4)):
            Circle(SKETCH7_R)
    cut_extrude7_tool2 = extrude(cut_extrude7_sk2.sketch, amount=-CUT_EXTRUDE7_REACH, mode=Mode.PRIVATE) & part.part
    add(cut_extrude7_tool2.solids().sort_by_distance((8.206971, 0, 41.4))[0], mode=Mode.SUBTRACT)
    # Sketch7 → Cut-Extrude7 (cut, up to next)
    with BuildSketch(Plane(origin=(0, 0, 0), x_dir=(-1, 0, 0), z_dir=(0, -1, 0)), mode=Mode.PRIVATE) as cut_extrude7_sk3:
        with Locations((-23.506971283, -92.2)):
            Circle(SKETCH7_R)
    cut_extrude7_tool3 = extrude(cut_extrude7_sk3.sketch, amount=-CUT_EXTRUDE7_REACH, mode=Mode.PRIVATE) & part.part
    add(cut_extrude7_tool3.solids().sort_by_distance((23.506971, 0, 92.2))[0], mode=Mode.SUBTRACT)
    # Sketch7 → Cut-Extrude7 (cut, up to next)
    with BuildSketch(Plane(origin=(0, 0, 0), x_dir=(-1, 0, 0), z_dir=(0, -1, 0)), mode=Mode.PRIVATE) as cut_extrude7_sk4:
        with Locations((24.793028717, -93.8)):
            Circle(SKETCH7_R)
    cut_extrude7_tool4 = extrude(cut_extrude7_sk4.sketch, amount=-CUT_EXTRUDE7_REACH, mode=Mode.PRIVATE) & part.part
    add(cut_extrude7_tool4.solids().sort_by_distance((-24.793029, 0, 93.8))[0], mode=Mode.SUBTRACT)

    # Sketch8 → Cut-Extrude8 (cut, up to next)
    with BuildSketch(Plane(origin=(0, 0, 0), x_dir=(-1, 0, 0), z_dir=(0, -1, 0)), mode=Mode.PRIVATE) as cut_extrude8_sk1:
        with Locations((41.143028717, -105.838250208)):
            Circle(SKETCH8_R)
    cut_extrude8_tool1 = extrude(cut_extrude8_sk1.sketch, amount=-CUT_EXTRUDE8_REACH, mode=Mode.PRIVATE) & part.part
    add(cut_extrude8_tool1.solids().sort_by_distance((-41.143029, 0, 105.83825))[0], mode=Mode.SUBTRACT)
    # Sketch8 → Cut-Extrude8 (cut, up to next)
    with BuildSketch(Plane(origin=(0, 0, 0), x_dir=(-1, 0, 0), z_dir=(0, -1, 0)), mode=Mode.PRIVATE) as cut_extrude8_sk2:
        with Locations((41.143028717, -22.838250208)):
            Circle(SKETCH8_R)
    cut_extrude8_tool2 = extrude(cut_extrude8_sk2.sketch, amount=-CUT_EXTRUDE8_REACH, mode=Mode.PRIVATE) & part.part
    add(cut_extrude8_tool2.solids().sort_by_distance((-41.143029, 0, 22.83825))[0], mode=Mode.SUBTRACT)
    # Sketch8 → Cut-Extrude8 (cut, up to next)
    with BuildSketch(Plane(origin=(0, 0, 0), x_dir=(-1, 0, 0), z_dir=(0, -1, 0)), mode=Mode.PRIVATE) as cut_extrude8_sk3:
        with Locations((-39.856971283, -22.838250208)):
            Circle(SKETCH8_R)
    cut_extrude8_tool3 = extrude(cut_extrude8_sk3.sketch, amount=-CUT_EXTRUDE8_REACH, mode=Mode.PRIVATE) & part.part
    add(cut_extrude8_tool3.solids().sort_by_distance((39.856971, 0, 22.83825))[0], mode=Mode.SUBTRACT)
    # Sketch8 → Cut-Extrude8 (cut, up to next)
    with BuildSketch(Plane(origin=(0, 0, 0), x_dir=(-1, 0, 0), z_dir=(0, -1, 0)), mode=Mode.PRIVATE) as cut_extrude8_sk4:
        with Locations((-39.856971283, -105.838250208)):
            Circle(SKETCH8_R)
    cut_extrude8_tool4 = extrude(cut_extrude8_sk4.sketch, amount=-CUT_EXTRUDE8_REACH, mode=Mode.PRIVATE) & part.part
    add(cut_extrude8_tool4.solids().sort_by_distance((39.856971, 0, 105.83825))[0], mode=Mode.SUBTRACT)


solid = part.part
